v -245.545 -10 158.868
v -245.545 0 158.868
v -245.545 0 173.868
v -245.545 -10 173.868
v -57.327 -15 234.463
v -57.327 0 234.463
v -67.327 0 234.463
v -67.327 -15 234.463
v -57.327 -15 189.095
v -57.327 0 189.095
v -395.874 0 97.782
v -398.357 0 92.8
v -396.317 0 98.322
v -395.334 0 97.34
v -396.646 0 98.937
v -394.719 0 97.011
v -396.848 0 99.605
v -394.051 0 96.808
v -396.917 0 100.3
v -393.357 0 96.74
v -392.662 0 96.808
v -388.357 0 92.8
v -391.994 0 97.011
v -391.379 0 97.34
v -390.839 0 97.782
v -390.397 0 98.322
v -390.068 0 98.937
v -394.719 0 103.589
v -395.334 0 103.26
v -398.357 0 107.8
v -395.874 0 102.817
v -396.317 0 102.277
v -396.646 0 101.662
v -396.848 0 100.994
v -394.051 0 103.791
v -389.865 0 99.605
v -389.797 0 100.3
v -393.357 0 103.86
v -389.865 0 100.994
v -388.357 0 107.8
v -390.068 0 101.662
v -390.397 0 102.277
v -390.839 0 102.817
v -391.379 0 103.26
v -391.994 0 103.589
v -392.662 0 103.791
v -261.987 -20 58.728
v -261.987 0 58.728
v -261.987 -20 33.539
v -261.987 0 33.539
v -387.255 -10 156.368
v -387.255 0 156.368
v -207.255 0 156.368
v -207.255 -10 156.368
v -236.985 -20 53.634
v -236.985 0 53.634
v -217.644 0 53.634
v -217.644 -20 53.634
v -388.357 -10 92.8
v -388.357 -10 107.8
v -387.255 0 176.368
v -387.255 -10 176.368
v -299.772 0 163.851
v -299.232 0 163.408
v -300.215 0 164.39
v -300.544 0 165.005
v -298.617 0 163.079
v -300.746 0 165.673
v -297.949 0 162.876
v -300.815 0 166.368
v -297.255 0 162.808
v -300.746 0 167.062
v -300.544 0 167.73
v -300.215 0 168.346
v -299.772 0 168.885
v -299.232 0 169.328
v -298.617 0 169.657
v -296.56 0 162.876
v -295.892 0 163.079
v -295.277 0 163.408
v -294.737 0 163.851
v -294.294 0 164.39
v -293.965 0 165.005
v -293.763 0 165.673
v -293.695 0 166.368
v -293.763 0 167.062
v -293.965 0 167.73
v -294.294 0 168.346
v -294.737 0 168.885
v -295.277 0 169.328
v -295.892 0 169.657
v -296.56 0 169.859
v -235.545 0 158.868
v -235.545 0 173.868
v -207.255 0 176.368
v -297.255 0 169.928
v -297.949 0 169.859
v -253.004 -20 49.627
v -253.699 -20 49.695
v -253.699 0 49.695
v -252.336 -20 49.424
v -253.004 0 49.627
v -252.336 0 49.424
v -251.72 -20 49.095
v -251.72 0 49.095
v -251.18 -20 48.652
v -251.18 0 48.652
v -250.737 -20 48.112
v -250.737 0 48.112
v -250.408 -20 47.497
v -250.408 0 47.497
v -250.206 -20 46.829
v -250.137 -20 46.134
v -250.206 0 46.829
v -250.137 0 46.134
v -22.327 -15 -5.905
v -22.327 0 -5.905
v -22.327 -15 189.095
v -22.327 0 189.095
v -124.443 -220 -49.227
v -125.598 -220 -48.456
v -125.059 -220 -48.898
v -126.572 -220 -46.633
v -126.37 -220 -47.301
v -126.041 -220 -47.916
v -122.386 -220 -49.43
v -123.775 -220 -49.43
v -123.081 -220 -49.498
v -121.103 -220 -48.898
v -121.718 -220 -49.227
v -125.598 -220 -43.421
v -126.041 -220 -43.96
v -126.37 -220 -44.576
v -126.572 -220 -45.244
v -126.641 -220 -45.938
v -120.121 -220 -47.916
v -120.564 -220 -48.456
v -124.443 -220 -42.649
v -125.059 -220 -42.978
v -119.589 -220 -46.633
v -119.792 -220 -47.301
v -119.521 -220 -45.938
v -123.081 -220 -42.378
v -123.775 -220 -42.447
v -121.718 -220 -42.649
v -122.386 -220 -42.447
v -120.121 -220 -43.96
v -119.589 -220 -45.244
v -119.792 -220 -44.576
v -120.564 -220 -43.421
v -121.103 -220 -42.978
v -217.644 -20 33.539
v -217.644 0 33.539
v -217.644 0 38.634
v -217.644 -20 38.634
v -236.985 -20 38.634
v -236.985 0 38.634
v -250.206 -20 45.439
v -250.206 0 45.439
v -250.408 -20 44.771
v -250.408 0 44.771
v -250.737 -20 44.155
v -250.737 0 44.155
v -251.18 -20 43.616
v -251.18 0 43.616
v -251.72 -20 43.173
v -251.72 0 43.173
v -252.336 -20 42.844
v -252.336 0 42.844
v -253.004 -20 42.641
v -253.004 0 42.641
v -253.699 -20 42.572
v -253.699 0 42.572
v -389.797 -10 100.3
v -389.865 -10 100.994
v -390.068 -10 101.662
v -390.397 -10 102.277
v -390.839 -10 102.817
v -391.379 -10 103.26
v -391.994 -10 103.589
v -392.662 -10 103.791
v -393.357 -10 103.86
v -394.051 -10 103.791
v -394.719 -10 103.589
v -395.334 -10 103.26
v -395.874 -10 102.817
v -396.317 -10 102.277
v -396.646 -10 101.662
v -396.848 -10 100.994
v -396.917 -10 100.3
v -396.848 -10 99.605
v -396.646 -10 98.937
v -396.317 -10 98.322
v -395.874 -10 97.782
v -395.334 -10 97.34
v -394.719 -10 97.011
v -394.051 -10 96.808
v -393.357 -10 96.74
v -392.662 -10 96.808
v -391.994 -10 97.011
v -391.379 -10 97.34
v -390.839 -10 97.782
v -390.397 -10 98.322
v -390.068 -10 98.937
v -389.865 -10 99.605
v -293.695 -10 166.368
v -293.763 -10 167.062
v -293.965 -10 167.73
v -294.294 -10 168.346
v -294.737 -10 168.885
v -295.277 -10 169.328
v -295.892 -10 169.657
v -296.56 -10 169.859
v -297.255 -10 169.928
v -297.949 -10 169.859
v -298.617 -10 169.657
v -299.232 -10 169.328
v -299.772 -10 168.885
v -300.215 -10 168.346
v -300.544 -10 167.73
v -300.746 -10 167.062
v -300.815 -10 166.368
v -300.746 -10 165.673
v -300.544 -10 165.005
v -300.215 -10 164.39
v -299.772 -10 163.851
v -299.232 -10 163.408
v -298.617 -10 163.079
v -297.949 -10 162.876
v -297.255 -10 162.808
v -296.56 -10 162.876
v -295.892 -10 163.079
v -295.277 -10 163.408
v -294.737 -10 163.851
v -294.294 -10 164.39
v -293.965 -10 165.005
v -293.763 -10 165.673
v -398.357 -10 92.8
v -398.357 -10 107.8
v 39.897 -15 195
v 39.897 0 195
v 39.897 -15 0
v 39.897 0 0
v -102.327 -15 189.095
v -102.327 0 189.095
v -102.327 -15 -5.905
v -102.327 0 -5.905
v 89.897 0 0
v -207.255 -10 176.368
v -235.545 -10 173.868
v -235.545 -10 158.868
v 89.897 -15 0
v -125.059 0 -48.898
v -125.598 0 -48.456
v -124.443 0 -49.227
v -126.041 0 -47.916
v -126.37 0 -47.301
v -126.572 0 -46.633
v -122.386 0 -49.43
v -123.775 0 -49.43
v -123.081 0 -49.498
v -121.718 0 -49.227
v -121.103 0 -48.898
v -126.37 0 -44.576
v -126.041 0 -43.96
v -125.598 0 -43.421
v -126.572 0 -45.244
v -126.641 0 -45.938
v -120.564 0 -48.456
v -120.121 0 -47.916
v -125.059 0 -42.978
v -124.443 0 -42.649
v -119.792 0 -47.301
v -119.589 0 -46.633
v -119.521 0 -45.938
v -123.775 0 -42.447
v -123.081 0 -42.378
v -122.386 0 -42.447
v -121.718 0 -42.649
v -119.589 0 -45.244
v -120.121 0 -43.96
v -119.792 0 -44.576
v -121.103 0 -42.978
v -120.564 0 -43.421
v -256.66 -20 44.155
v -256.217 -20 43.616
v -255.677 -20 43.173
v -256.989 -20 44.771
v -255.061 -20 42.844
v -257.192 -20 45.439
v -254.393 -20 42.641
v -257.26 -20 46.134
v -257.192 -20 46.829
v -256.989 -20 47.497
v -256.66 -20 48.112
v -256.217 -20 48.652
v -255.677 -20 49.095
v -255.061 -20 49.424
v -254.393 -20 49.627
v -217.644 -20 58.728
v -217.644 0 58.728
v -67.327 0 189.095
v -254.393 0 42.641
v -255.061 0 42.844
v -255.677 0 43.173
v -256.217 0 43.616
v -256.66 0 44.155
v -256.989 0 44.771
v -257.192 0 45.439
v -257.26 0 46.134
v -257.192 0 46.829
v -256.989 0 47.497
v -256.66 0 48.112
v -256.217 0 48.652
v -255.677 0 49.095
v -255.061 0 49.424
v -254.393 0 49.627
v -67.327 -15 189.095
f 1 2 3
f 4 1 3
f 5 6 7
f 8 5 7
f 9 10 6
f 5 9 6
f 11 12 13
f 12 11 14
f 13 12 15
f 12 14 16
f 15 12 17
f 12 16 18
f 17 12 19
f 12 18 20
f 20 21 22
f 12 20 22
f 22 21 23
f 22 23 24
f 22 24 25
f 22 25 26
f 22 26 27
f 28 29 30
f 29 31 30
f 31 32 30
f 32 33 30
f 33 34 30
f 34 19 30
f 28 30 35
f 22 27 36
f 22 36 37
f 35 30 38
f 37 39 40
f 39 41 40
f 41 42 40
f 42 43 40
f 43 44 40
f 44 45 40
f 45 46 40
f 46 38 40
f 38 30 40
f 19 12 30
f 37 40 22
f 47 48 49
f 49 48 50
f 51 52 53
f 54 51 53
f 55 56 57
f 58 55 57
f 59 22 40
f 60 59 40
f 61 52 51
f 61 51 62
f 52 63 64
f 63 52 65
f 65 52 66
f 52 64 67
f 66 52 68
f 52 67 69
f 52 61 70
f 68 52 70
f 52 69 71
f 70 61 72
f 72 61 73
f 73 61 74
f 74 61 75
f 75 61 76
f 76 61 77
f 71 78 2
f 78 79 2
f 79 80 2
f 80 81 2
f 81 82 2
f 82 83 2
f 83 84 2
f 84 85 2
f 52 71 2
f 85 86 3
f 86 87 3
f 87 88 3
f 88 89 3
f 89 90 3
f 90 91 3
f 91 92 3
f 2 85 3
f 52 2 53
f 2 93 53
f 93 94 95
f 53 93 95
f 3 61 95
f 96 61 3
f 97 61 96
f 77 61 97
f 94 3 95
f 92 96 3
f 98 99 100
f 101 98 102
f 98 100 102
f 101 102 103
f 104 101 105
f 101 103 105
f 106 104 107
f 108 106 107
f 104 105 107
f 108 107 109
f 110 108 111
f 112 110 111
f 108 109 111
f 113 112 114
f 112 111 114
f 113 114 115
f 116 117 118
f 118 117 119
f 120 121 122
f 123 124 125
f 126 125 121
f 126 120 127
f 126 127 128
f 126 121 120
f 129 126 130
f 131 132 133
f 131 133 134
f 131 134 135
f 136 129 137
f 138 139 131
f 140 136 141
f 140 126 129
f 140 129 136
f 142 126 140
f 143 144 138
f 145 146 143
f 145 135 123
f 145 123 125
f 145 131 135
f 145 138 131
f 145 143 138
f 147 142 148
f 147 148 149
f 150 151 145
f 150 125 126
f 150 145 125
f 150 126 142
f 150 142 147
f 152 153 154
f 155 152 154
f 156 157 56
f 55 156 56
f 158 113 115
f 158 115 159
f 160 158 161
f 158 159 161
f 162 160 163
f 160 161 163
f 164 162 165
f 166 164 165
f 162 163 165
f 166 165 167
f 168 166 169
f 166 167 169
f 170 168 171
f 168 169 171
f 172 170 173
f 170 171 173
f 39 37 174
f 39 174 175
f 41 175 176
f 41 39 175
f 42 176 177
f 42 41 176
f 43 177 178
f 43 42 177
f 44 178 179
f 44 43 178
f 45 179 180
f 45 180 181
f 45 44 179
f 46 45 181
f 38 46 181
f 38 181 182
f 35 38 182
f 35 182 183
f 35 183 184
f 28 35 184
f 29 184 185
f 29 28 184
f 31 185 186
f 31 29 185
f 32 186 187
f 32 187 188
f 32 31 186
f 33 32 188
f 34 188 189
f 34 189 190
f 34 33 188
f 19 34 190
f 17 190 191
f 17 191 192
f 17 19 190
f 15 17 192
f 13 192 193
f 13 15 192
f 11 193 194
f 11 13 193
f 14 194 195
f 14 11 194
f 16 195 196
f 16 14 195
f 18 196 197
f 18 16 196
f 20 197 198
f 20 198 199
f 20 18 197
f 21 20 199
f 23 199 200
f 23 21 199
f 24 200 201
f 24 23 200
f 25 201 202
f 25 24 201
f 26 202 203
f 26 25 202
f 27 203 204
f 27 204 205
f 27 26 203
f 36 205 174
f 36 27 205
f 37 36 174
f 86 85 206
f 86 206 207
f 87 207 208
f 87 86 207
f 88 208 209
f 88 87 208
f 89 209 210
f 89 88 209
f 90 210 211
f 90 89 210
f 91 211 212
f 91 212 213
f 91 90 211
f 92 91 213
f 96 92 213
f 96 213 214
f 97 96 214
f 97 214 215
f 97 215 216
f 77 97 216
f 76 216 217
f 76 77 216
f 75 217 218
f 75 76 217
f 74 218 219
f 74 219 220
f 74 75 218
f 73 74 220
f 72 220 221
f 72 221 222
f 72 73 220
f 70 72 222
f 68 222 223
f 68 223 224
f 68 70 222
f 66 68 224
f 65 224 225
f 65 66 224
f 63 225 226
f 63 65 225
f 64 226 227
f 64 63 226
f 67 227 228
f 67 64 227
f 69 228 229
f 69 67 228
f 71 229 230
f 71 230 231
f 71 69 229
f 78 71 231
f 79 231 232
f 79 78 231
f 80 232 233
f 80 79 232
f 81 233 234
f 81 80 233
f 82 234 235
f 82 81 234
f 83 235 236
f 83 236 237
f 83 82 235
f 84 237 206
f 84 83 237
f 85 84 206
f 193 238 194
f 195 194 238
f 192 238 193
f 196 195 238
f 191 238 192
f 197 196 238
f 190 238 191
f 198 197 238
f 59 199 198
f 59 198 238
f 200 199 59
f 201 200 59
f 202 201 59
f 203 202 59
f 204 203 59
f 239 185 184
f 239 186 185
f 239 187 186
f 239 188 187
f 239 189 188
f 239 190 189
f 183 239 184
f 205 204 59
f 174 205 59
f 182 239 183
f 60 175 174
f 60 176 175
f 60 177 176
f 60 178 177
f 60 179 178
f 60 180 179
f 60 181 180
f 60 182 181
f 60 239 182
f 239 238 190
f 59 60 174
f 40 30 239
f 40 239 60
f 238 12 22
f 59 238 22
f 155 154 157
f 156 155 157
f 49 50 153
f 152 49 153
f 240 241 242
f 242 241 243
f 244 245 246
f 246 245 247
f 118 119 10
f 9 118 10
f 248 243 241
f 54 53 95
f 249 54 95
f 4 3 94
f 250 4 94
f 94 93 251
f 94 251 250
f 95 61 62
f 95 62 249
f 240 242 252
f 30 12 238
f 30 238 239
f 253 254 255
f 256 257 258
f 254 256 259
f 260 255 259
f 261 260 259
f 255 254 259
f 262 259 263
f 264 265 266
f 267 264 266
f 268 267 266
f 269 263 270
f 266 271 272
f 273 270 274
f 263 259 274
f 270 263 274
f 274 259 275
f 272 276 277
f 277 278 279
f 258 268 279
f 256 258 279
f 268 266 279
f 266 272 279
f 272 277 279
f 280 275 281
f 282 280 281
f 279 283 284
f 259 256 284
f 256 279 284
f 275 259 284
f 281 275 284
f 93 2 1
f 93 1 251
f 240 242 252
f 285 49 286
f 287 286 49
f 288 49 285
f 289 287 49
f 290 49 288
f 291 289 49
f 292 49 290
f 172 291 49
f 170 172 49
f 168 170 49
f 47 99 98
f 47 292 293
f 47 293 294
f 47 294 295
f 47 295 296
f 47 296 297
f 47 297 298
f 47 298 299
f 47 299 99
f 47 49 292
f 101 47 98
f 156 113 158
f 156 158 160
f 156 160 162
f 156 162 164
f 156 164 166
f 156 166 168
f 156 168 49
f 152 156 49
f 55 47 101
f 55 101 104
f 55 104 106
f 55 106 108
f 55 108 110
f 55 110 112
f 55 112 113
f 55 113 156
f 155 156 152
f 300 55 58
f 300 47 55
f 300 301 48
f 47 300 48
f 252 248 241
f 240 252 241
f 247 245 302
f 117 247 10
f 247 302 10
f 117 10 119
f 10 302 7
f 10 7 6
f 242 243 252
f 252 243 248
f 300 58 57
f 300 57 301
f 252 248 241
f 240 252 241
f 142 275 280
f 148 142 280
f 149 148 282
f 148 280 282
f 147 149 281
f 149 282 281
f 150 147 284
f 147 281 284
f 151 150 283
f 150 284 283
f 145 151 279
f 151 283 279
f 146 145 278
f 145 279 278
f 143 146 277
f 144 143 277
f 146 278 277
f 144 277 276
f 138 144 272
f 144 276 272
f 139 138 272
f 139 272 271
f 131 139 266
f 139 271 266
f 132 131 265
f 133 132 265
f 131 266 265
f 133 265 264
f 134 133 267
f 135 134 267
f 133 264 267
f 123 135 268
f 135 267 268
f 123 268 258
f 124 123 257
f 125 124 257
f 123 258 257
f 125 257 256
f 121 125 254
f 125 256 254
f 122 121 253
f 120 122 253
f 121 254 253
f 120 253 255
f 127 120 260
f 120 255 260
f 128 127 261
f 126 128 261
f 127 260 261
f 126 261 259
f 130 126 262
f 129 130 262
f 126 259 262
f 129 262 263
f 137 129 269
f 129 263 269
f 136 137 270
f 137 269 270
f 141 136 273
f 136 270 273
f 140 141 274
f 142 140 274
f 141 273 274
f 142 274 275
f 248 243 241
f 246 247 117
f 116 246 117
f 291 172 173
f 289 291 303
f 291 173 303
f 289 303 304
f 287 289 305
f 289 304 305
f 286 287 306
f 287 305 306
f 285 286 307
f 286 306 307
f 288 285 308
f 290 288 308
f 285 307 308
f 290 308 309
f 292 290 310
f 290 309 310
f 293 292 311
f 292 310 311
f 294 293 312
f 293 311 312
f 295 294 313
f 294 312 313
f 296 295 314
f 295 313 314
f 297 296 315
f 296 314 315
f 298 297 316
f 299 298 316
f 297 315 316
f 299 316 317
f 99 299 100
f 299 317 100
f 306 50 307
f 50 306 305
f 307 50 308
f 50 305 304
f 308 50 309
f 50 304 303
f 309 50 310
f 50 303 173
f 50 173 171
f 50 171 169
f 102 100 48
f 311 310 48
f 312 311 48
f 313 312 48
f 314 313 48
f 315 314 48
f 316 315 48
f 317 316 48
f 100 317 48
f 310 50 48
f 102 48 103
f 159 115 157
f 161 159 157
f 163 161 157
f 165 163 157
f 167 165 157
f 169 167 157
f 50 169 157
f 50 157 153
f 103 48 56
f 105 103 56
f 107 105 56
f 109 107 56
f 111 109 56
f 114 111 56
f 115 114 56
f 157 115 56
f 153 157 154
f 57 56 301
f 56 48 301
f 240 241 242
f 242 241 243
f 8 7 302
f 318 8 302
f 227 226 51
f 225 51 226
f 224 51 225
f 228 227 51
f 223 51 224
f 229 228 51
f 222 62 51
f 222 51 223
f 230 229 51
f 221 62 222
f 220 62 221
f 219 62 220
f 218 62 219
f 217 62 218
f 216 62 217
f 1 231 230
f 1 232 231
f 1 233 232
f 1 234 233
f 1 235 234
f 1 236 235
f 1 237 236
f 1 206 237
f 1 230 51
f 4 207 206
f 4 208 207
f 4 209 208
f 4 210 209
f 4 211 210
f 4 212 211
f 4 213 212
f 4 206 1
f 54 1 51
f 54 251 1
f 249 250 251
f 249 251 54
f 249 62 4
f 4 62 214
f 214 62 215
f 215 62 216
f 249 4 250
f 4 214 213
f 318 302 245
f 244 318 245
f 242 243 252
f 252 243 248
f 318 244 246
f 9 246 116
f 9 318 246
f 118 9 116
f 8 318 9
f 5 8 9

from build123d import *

# Parameters (mm, degrees)
F1_DEPTH = 20
F0_R     = 3.56
F2_DEPTH = 220
F0_W     = 180
F0_H     = 20
F0_W_2   = 10
F0_H_2   = 15
F3_DEPTH = 10
F4_DEPTH = 10
F5_DEPTH = 15
F6_DEPTH = 15


# Not quite as in the source:
# - a feature names something its author has since deleted; it is built from what else it names


with BuildPart() as f1:
    # F0 (on Front) → F1 (new body)
    with BuildSketch(Plane.XZ):
        with BuildLine():
            Line((-217.6441787565, 33.5391576588), (-217.6441787565, 38.6338087916))
            Line((-217.6441787565, 38.6338087916), (-236.9845063496, 38.6338087916))
            Line((-236.9845063496, 38.6338087916), (-236.9845063496, 53.6338087916))
            Line((-236.9845063496, 53.6338087916), (-217.6441787565, 53.6338087916))
            Line((-217.6441787565, 53.6338087916), (-217.6441787565, 58.7284599245))
            Line((-217.6441787565, 58.7284599245), (-253.6986111486, 58.7284599245))
            Line((-253.6986111486, 58.7284599245), (-253.6986111486, 49.6951619717))
            ThreePointArc((-253.6986111486, 49.6951619717), (-251.1803541648, 48.6520657755), (-250.1372579685, 46.1338087916))
            ThreePointArc((-250.1372579685, 46.1338087916), (-251.1803541648, 43.6155518078), (-253.6986111486, 42.5724556116))
            Line((-253.6986111486, 42.5724556116), (-253.6986111486, 33.5391576588))
            Line((-253.6986111486, 33.5391576588), (-217.6441787565, 33.5391576588))
        make_face()
        with BuildLine():
            Line((-261.9873631382, 33.5391576588), (-253.6986111486, 33.5391576588))
            Line((-253.6986111486, 33.5391576588), (-253.6986111486, 42.5724556116))
            ThreePointArc((-253.6986111486, 42.5724556116), (-257.2599643287, 46.1338087916), (-253.6986111486, 49.6951619717))
            Line((-253.6986111486, 49.6951619717), (-253.6986111486, 58.7284599245))
            Line((-253.6986111486, 58.7284599245), (-261.9873631382, 58.7284599245))
            Line((-261.9873631382, 58.7284599245), (-261.9873631382, 33.5391576588))
        make_face()
    extrude(amount=F1_DEPTH)


with BuildPart() as f2:
    # F0 (on Front) → F2 (new body)
    with BuildSketch(Plane.XZ):
        with Locations((-123.0808347464, -45.9383092821)):
            Circle(F0_R)
    extrude(amount=F2_DEPTH)


with BuildPart() as f3:
    # F0 (on Front) → F3 (new body)
    with BuildSketch(Plane.XZ):
        with Locations((-297.2545063496, 166.3678210974)):
            Rectangle(F0_W, F0_H)
        with Locations((-297.2545063496, 166.3678210974)):
            Circle(F0_R, mode=Mode.SUBTRACT)
        with Locations((-240.5445063496, 166.3678210974)):
            Rectangle(F0_W_2, F0_H_2, mode=Mode.SUBTRACT)
    extrude(amount=F3_DEPTH)


with BuildPart() as f4:
    # F0 (on Front) → F4 (new body)
    with BuildSketch(Plane.XZ):
        with Locations((-393.356616497, 100.299641192)):
            Rectangle(F0_W_2, F0_H_2)
        with Locations((-393.356616497, 100.299641192)):
            Circle(F0_R, mode=Mode.SUBTRACT)
    extrude(amount=F4_DEPTH)


with BuildPart() as f5:
    # F0 (on Front) → F5 (new body)
    with BuildSketch(Plane.XZ):
        Polygon((-102.3273542523, -5.9048458934), (-22.3273542523, -5.9048458934), (-22.3273542523, 189.0951541066), (-57.3273542523, 189.0951541066), (-62.3273542523, 189.0951541066), (-67.3273542523, 189.0951541066), (-102.3273542523, 189.0951541066), align=None)
        Polygon((-62.3273542523, 189.0951541066), (-57.3273542523, 189.0951541066), (-57.3273542523, 234.4632595778), (-67.3273542523, 234.4632595778), (-67.3273542523, 189.0951541066), align=None)
    extrude(amount=F5_DEPTH)


with BuildPart() as f5b:
    # F0 (on Front) → F5, piece 2 (new body)
    with BuildSketch(Plane.XZ):
        Polygon((89.8966632783, 0), (39.8966632783, 195), (39.8966632783, 0), align=None)
    extrude(amount=F5_DEPTH)


with BuildPart() as f6:
    # F0 (on Front) → F6 (new body)
    with BuildSketch(Plane.XZ):
        Polygon((89.8966632783, 0), (39.8966632783, 195), (39.8966632783, 0), align=None)
    extrude(amount=F6_DEPTH)


solid = Compound([f1.part, f2.part, f3.part, f4.part, f5.part, f5b.part, f6.part])
